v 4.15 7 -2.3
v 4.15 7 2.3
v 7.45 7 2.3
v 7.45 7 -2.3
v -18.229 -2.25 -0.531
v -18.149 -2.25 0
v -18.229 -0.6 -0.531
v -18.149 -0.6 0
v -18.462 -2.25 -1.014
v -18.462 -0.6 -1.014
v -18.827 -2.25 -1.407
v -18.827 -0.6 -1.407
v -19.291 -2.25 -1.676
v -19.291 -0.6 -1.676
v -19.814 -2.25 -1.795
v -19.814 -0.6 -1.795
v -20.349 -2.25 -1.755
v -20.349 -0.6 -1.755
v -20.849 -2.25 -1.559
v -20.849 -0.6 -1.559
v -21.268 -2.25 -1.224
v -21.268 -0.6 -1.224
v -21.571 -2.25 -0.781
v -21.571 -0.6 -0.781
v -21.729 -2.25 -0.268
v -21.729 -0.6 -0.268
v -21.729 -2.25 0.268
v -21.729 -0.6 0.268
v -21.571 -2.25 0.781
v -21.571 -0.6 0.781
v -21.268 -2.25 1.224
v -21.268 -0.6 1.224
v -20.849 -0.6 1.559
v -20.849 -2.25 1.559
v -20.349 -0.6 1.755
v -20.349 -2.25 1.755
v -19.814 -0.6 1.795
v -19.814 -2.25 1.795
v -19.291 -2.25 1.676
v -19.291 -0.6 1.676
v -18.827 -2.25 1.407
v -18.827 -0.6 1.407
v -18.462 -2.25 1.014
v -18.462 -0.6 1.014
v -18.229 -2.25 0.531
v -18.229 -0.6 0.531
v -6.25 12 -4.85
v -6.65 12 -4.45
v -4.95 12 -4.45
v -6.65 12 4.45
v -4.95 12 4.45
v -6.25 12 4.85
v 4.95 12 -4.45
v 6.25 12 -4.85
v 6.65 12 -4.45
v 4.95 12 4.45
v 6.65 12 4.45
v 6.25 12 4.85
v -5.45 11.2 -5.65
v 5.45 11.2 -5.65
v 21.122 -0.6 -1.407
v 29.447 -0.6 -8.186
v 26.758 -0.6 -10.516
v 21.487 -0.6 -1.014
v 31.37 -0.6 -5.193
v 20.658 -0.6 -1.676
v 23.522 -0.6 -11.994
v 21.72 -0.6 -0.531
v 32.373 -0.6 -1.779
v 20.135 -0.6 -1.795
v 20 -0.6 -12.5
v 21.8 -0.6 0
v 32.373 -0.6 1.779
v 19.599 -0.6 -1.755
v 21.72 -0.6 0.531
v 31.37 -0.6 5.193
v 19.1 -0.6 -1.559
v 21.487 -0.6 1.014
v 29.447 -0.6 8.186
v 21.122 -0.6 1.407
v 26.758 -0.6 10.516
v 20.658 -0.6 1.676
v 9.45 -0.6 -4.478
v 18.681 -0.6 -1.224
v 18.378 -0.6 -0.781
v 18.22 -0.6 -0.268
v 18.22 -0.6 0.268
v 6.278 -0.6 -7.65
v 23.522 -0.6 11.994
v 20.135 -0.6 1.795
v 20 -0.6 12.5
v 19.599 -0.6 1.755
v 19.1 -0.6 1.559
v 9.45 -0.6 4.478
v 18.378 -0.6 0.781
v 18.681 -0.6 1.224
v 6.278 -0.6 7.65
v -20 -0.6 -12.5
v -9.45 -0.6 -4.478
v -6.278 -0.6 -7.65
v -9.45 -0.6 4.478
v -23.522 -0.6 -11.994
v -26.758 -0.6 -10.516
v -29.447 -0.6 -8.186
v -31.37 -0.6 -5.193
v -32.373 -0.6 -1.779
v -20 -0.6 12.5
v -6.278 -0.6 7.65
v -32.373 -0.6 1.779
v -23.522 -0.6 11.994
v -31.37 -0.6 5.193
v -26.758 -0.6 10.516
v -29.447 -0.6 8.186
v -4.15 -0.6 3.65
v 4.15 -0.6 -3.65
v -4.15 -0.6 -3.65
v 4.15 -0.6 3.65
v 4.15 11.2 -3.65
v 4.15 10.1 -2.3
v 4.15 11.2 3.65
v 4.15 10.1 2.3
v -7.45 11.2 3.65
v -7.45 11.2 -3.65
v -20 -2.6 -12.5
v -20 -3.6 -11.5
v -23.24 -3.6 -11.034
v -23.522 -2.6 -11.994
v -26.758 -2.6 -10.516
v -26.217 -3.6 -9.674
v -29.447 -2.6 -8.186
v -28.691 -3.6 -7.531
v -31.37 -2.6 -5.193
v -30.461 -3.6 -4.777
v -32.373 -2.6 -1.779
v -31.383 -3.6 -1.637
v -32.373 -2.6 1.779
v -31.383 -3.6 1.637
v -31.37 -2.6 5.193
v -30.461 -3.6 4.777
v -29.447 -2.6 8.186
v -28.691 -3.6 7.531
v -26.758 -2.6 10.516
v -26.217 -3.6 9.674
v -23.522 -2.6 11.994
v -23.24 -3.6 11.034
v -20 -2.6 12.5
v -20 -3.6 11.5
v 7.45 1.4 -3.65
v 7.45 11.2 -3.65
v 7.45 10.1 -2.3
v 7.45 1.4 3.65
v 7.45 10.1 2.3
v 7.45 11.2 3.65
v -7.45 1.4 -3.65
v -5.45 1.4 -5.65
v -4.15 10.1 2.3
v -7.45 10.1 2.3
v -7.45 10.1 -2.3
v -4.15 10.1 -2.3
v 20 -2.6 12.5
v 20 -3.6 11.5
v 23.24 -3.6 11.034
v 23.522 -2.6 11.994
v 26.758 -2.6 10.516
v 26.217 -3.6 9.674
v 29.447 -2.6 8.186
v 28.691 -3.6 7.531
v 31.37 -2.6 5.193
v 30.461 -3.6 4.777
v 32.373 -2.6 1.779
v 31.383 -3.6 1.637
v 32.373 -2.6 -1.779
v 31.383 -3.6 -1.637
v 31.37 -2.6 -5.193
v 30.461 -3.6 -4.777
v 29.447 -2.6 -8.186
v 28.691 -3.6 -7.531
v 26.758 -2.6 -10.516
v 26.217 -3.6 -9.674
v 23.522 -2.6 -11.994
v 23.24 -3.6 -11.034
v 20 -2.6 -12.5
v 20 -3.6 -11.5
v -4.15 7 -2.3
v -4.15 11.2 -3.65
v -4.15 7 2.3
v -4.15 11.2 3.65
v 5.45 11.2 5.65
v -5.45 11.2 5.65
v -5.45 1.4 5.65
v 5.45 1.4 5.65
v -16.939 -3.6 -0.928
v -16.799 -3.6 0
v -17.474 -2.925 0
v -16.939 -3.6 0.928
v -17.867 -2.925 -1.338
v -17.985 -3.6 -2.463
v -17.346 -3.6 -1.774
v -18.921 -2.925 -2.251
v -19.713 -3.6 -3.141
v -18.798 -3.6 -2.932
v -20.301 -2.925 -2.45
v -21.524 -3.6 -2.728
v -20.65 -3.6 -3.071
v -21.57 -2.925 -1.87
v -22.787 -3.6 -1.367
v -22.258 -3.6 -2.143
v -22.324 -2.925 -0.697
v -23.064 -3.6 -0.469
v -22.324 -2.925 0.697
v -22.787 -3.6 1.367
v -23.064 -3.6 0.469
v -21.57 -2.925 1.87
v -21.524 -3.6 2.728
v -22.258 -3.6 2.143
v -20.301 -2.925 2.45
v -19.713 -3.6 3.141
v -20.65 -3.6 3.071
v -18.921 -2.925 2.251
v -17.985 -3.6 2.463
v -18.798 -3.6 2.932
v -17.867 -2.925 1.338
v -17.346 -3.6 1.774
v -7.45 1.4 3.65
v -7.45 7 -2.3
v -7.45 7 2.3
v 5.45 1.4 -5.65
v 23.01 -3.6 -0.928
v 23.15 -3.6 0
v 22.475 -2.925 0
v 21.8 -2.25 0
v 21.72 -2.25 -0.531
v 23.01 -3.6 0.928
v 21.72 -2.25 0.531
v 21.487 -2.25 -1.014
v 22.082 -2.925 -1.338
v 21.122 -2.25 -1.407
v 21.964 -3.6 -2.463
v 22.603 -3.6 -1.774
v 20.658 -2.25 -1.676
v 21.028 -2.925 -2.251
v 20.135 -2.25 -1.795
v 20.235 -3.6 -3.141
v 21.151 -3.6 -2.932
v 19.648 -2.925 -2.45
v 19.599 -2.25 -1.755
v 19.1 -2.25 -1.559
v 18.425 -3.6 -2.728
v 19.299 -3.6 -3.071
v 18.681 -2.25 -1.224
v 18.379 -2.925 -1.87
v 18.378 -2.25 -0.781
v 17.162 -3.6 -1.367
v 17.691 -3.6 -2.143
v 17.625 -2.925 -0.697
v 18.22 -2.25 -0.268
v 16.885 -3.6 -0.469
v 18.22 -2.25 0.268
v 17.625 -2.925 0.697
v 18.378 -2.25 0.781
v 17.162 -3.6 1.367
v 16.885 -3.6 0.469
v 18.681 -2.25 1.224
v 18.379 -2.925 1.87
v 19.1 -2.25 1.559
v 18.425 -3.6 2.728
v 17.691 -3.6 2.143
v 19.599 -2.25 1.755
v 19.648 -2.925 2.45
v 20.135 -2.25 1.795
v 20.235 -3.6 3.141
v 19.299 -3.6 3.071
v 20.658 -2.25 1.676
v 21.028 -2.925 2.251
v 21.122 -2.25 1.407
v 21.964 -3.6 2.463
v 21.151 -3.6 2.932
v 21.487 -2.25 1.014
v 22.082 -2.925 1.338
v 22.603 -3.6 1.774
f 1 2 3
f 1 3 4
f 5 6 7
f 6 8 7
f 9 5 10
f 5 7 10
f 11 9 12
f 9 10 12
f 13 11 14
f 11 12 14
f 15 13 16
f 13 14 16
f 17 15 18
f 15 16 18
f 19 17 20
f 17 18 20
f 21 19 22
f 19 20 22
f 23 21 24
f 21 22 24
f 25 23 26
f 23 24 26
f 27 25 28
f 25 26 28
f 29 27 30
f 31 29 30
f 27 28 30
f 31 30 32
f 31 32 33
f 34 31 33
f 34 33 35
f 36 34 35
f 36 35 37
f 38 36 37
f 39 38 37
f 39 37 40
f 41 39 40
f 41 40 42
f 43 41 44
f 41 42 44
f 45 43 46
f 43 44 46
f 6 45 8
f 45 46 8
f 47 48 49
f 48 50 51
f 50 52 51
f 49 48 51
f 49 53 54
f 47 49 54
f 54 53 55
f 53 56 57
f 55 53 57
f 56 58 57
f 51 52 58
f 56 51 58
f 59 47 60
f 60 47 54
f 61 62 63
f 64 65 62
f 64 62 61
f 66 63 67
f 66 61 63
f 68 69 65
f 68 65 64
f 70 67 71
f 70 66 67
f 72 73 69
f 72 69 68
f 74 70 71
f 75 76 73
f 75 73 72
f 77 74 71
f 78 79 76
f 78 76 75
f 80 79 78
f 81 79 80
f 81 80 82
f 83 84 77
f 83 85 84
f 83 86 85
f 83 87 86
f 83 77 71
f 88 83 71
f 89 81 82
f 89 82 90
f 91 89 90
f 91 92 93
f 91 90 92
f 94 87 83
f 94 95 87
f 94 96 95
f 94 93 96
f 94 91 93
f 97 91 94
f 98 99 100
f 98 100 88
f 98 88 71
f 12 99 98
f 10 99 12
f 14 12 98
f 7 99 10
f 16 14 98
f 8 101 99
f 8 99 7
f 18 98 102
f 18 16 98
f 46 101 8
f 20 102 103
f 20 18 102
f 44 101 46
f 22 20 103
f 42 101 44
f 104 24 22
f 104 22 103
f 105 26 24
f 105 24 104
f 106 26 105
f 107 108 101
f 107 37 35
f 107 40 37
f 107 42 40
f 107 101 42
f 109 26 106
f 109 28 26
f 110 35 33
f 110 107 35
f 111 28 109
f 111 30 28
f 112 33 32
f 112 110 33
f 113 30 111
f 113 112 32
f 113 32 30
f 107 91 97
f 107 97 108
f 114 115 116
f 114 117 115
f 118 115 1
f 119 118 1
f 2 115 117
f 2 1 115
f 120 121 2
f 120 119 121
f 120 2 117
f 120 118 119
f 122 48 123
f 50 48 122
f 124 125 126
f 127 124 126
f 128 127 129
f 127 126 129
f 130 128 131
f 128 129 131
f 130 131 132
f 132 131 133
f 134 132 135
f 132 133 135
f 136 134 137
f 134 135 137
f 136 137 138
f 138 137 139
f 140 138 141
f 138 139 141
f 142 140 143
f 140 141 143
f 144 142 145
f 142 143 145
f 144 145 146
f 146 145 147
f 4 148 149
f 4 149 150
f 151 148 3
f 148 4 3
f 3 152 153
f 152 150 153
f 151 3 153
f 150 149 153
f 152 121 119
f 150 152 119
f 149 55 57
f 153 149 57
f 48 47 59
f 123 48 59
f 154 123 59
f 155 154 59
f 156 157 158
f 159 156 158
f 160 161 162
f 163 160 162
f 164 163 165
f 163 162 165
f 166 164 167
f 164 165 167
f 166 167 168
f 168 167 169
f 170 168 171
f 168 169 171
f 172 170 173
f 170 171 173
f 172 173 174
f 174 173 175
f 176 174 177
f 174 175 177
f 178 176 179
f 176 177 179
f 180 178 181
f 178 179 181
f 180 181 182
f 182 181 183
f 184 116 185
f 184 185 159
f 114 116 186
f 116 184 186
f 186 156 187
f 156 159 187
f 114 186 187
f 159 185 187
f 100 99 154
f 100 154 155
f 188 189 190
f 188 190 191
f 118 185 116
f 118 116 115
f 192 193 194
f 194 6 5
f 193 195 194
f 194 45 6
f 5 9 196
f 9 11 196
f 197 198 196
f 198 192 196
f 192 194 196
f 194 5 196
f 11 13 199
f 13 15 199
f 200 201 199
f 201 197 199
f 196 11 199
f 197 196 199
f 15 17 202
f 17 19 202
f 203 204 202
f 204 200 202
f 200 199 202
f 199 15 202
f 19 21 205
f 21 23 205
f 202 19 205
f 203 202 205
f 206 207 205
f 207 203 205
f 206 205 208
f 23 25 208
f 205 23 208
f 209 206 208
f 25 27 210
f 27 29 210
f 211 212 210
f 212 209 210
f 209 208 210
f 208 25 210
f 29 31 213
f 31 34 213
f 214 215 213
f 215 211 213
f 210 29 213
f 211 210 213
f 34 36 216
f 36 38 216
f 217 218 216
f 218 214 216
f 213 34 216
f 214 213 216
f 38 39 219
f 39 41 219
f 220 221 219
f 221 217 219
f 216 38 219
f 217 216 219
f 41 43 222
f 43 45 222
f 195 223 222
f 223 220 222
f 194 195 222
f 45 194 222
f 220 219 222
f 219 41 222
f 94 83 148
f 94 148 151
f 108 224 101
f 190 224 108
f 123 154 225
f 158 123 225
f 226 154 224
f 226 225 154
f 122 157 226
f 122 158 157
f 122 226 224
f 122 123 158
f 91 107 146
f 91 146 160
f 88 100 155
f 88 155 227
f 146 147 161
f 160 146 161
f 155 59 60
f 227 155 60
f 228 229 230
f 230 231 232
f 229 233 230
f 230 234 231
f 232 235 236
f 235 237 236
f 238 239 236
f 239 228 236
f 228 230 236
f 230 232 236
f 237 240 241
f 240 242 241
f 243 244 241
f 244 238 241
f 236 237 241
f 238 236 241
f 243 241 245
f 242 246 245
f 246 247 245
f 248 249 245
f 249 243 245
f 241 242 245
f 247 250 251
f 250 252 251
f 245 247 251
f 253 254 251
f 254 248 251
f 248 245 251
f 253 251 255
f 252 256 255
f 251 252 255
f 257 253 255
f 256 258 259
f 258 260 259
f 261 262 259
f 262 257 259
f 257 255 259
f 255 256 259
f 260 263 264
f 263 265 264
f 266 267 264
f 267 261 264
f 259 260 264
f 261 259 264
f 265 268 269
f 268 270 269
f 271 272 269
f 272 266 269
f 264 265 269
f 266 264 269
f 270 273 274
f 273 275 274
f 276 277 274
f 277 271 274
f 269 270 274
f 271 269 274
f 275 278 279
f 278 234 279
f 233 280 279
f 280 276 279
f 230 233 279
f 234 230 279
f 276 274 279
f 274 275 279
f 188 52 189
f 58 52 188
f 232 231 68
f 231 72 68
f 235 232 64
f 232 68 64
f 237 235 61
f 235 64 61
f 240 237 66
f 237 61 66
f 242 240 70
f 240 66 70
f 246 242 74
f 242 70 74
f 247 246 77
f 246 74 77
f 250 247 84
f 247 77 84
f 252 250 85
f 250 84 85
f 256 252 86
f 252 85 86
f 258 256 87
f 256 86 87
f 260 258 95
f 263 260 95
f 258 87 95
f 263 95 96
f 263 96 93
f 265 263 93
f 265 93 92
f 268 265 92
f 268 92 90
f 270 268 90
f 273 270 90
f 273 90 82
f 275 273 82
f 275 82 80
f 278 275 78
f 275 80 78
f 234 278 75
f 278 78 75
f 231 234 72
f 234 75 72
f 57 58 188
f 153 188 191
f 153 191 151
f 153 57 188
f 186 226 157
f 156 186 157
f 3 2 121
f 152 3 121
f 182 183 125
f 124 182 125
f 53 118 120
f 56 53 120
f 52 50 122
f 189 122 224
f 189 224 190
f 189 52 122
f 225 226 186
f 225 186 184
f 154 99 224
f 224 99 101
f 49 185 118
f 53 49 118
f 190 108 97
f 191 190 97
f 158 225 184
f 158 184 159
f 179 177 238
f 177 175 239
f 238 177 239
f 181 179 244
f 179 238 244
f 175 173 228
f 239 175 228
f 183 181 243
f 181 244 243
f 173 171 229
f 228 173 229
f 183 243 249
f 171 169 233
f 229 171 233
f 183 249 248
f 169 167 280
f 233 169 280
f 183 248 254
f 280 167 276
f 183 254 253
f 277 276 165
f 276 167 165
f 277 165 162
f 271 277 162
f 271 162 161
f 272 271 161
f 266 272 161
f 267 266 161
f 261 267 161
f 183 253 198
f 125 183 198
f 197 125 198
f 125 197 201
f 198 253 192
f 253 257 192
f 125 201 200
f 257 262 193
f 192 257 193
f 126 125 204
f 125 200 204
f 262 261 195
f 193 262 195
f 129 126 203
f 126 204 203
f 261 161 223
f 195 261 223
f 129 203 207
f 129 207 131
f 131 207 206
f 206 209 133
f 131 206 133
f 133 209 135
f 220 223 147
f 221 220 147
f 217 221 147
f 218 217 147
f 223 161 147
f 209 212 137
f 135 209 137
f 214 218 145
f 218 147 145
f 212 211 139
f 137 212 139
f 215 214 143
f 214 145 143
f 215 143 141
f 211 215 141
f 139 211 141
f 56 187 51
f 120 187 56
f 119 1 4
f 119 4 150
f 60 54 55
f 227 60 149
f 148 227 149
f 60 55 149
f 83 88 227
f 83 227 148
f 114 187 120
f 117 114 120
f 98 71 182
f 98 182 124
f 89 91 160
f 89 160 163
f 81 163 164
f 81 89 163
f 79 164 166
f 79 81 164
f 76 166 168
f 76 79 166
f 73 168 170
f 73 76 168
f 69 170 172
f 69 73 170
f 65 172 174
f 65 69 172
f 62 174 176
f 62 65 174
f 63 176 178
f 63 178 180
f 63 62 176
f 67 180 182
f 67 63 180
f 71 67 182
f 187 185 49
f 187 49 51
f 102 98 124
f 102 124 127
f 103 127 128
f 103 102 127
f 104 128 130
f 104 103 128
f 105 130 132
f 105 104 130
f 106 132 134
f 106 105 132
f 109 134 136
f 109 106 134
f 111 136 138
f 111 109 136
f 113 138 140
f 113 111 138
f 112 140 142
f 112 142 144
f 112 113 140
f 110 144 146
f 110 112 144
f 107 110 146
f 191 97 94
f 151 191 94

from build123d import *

# Parameters (mm, degrees)
SKETCH2_W                                       = 14.9
SKETCH2_H                                       = 11.3
SKETCH2_W_2                                     = 8.3
SKETCH2_H_2                                     = 7.3
BOSS_EXTRUDE1_DEPTH                             = 12.6
CUT_EXTRUDE1_DEPTH                              = 16.212659202
CUT_EXTRUDE1_DEPTH_BACK                         = 16.212659202
SKETCH4_W                                       = 4.6
SKETCH4_H                                       = 3.1
BOSS_EXTRUDE2_DEPTH                             = 3
CHAMFER1_SIZE                                   = 1
CHAMFER2_SIZE                                   = 0.8
CHAMFER3_SIZE                                   = 2
CSK_FOR_M3_FLAT_HEAD_MACHINE_SCREW1_D           = 3.6
CSK_FOR_M3_FLAT_HEAD_MACHINE_SCREW1_CSINK_D     = 6.3
CSK_FOR_M3_FLAT_HEAD_MACHINE_SCREW1_CSINK_ANGLE = 90
CHAMFER4_SIZE                                   = 2


with BuildPart() as part:
    # Sketch2 → Boss-Extrude1 (new body)
    with BuildSketch(Plane.XZ.offset(-12)):
        Rectangle(SKETCH2_W, SKETCH2_H)
        Rectangle(SKETCH2_W_2, SKETCH2_H_2, mode=Mode.SUBTRACT)
    extrude(amount=BOSS_EXTRUDE1_DEPTH)

    # Sketch4 → Cut-Extrude1 (cut, two sides: drawn at the far end of the back side and taken through both)
    with BuildSketch(Plane(origin=(0, 0, 0), x_dir=(0, 0, -1), z_dir=(1, 0, 0)).offset(-CUT_EXTRUDE1_DEPTH_BACK)):
        with Locations((0, 8.55)):
            Rectangle(SKETCH4_W, SKETCH4_H)
    extrude(amount=CUT_EXTRUDE1_DEPTH + CUT_EXTRUDE1_DEPTH_BACK, mode=Mode.SUBTRACT)

    # Sketch5 → Boss-Extrude2 (add)
    with BuildSketch(Plane.XZ.offset(0.6)):
        with BuildLine():
            Line((-20, 12.5), (20, 12.5))
            ThreePointArc((20, 12.5), (32.5, 0), (20, -12.5))
            Line((20, -12.5), (-20, -12.5))
            ThreePointArc((-20, -12.5), (-32.5, 0), (-20, 12.5))
        make_face()
    extrude(amount=BOSS_EXTRUDE2_DEPTH)

    # Chamfer1
    chamfer1_edges = [part.edges().sort_by_distance(p)[0] for p in [
        (-32.5, -3.6, 0),
        (0, -3.6, -12.5),
        (32.5, -3.6, 0),
        (0, -3.6, 12.5),
    ]]
    chamfer(chamfer1_edges, length=CHAMFER1_SIZE)

    # Chamfer2
    chamfer2_edges = [part.edges().sort_by_distance(p)[0] for p in [
        (0, 12, -3.65),
        (4.15, 12, 0),
        (0, 12, 3.65),
        (-4.15, 12, 0),
        (0, 12, -5.65),
        (-7.45, 12, 0),
        (0, 12, 5.65),
        (7.45, 12, 0),
    ]]
    chamfer(chamfer2_edges, length=CHAMFER2_SIZE)

    # Chamfer3
    # the kernel refuses this chamfer: 2 mm, written as the material it takes off along each edge
    with BuildSketch(Plane(origin=(-7.45, 16.343365976, 5.65), x_dir=(-0.027495876610586053, 0, -0.9996219169112968), z_dir=(0, -1, 0)), Plane(origin=(7.45, 16.343365976, 5.65), x_dir=(-0.9996219169112968, 0, 0.027495876610586487), z_dir=(0, -1, 0))) as chamfer3_piece_1:
        Polygon((CHAMFER3_SIZE * 0.999621916911, CHAMFER3_SIZE * 0.0274958766106), (-CHAMFER3_SIZE * 0.0274958766106, CHAMFER3_SIZE * 0.999621916911), (0, 0), align=None)
    extrude(amount=16.943365976, mode=Mode.SUBTRACT)
    with BuildSketch(Plane(origin=(-7.45, 16.343365976, -5.65), x_dir=(-0.027495876610586924, 0, 0.9996219169112968), z_dir=(0, -1, 0)), Plane(origin=(7.45, 16.343365976, -5.65), x_dir=(-0.9996219169112968, 0, -0.027495876610586487), z_dir=(0, -1, 0))) as chamfer3_piece_2:
        Polygon((CHAMFER3_SIZE * 0.999621916911, -CHAMFER3_SIZE * 0.0274958766106), (-CHAMFER3_SIZE * 0.0274958766106, -CHAMFER3_SIZE * 0.999621916911), (0, 0), align=None)
    extrude(amount=16.943365976, mode=Mode.SUBTRACT)

    # CSK for M3 Flat Head Machine Screw1 (through all)
    with Locations(Plane(origin=(0, -3.6, 0), x_dir=(-1, 0, 0), z_dir=(0, -1, 0))):
        with Locations((-20, 0), (19.948852039, 0)):
            CounterSinkHole(CSK_FOR_M3_FLAT_HEAD_MACHINE_SCREW1_D / 2, CSK_FOR_M3_FLAT_HEAD_MACHINE_SCREW1_CSINK_D / 2, counter_sink_angle=CSK_FOR_M3_FLAT_HEAD_MACHINE_SCREW1_CSINK_ANGLE)

    # Chamfer4
    chamfer4_edges = [part.edges().sort_by_distance(p)[0] for p in [
        (-7.45, -0.6, 0),
        (0, -0.6, 5.65),
        (0, -0.6, -5.65),
        (7.45, -0.6, 0),
        (-6.45, -0.6, 4.65),
        (-6.45, -0.6, -4.65),
        (6.45, -0.6, -4.65),
        (6.45, -0.6, 4.65),
    ]]
    chamfer(chamfer4_edges, length=CHAMFER4_SIZE)


solid = part.part
